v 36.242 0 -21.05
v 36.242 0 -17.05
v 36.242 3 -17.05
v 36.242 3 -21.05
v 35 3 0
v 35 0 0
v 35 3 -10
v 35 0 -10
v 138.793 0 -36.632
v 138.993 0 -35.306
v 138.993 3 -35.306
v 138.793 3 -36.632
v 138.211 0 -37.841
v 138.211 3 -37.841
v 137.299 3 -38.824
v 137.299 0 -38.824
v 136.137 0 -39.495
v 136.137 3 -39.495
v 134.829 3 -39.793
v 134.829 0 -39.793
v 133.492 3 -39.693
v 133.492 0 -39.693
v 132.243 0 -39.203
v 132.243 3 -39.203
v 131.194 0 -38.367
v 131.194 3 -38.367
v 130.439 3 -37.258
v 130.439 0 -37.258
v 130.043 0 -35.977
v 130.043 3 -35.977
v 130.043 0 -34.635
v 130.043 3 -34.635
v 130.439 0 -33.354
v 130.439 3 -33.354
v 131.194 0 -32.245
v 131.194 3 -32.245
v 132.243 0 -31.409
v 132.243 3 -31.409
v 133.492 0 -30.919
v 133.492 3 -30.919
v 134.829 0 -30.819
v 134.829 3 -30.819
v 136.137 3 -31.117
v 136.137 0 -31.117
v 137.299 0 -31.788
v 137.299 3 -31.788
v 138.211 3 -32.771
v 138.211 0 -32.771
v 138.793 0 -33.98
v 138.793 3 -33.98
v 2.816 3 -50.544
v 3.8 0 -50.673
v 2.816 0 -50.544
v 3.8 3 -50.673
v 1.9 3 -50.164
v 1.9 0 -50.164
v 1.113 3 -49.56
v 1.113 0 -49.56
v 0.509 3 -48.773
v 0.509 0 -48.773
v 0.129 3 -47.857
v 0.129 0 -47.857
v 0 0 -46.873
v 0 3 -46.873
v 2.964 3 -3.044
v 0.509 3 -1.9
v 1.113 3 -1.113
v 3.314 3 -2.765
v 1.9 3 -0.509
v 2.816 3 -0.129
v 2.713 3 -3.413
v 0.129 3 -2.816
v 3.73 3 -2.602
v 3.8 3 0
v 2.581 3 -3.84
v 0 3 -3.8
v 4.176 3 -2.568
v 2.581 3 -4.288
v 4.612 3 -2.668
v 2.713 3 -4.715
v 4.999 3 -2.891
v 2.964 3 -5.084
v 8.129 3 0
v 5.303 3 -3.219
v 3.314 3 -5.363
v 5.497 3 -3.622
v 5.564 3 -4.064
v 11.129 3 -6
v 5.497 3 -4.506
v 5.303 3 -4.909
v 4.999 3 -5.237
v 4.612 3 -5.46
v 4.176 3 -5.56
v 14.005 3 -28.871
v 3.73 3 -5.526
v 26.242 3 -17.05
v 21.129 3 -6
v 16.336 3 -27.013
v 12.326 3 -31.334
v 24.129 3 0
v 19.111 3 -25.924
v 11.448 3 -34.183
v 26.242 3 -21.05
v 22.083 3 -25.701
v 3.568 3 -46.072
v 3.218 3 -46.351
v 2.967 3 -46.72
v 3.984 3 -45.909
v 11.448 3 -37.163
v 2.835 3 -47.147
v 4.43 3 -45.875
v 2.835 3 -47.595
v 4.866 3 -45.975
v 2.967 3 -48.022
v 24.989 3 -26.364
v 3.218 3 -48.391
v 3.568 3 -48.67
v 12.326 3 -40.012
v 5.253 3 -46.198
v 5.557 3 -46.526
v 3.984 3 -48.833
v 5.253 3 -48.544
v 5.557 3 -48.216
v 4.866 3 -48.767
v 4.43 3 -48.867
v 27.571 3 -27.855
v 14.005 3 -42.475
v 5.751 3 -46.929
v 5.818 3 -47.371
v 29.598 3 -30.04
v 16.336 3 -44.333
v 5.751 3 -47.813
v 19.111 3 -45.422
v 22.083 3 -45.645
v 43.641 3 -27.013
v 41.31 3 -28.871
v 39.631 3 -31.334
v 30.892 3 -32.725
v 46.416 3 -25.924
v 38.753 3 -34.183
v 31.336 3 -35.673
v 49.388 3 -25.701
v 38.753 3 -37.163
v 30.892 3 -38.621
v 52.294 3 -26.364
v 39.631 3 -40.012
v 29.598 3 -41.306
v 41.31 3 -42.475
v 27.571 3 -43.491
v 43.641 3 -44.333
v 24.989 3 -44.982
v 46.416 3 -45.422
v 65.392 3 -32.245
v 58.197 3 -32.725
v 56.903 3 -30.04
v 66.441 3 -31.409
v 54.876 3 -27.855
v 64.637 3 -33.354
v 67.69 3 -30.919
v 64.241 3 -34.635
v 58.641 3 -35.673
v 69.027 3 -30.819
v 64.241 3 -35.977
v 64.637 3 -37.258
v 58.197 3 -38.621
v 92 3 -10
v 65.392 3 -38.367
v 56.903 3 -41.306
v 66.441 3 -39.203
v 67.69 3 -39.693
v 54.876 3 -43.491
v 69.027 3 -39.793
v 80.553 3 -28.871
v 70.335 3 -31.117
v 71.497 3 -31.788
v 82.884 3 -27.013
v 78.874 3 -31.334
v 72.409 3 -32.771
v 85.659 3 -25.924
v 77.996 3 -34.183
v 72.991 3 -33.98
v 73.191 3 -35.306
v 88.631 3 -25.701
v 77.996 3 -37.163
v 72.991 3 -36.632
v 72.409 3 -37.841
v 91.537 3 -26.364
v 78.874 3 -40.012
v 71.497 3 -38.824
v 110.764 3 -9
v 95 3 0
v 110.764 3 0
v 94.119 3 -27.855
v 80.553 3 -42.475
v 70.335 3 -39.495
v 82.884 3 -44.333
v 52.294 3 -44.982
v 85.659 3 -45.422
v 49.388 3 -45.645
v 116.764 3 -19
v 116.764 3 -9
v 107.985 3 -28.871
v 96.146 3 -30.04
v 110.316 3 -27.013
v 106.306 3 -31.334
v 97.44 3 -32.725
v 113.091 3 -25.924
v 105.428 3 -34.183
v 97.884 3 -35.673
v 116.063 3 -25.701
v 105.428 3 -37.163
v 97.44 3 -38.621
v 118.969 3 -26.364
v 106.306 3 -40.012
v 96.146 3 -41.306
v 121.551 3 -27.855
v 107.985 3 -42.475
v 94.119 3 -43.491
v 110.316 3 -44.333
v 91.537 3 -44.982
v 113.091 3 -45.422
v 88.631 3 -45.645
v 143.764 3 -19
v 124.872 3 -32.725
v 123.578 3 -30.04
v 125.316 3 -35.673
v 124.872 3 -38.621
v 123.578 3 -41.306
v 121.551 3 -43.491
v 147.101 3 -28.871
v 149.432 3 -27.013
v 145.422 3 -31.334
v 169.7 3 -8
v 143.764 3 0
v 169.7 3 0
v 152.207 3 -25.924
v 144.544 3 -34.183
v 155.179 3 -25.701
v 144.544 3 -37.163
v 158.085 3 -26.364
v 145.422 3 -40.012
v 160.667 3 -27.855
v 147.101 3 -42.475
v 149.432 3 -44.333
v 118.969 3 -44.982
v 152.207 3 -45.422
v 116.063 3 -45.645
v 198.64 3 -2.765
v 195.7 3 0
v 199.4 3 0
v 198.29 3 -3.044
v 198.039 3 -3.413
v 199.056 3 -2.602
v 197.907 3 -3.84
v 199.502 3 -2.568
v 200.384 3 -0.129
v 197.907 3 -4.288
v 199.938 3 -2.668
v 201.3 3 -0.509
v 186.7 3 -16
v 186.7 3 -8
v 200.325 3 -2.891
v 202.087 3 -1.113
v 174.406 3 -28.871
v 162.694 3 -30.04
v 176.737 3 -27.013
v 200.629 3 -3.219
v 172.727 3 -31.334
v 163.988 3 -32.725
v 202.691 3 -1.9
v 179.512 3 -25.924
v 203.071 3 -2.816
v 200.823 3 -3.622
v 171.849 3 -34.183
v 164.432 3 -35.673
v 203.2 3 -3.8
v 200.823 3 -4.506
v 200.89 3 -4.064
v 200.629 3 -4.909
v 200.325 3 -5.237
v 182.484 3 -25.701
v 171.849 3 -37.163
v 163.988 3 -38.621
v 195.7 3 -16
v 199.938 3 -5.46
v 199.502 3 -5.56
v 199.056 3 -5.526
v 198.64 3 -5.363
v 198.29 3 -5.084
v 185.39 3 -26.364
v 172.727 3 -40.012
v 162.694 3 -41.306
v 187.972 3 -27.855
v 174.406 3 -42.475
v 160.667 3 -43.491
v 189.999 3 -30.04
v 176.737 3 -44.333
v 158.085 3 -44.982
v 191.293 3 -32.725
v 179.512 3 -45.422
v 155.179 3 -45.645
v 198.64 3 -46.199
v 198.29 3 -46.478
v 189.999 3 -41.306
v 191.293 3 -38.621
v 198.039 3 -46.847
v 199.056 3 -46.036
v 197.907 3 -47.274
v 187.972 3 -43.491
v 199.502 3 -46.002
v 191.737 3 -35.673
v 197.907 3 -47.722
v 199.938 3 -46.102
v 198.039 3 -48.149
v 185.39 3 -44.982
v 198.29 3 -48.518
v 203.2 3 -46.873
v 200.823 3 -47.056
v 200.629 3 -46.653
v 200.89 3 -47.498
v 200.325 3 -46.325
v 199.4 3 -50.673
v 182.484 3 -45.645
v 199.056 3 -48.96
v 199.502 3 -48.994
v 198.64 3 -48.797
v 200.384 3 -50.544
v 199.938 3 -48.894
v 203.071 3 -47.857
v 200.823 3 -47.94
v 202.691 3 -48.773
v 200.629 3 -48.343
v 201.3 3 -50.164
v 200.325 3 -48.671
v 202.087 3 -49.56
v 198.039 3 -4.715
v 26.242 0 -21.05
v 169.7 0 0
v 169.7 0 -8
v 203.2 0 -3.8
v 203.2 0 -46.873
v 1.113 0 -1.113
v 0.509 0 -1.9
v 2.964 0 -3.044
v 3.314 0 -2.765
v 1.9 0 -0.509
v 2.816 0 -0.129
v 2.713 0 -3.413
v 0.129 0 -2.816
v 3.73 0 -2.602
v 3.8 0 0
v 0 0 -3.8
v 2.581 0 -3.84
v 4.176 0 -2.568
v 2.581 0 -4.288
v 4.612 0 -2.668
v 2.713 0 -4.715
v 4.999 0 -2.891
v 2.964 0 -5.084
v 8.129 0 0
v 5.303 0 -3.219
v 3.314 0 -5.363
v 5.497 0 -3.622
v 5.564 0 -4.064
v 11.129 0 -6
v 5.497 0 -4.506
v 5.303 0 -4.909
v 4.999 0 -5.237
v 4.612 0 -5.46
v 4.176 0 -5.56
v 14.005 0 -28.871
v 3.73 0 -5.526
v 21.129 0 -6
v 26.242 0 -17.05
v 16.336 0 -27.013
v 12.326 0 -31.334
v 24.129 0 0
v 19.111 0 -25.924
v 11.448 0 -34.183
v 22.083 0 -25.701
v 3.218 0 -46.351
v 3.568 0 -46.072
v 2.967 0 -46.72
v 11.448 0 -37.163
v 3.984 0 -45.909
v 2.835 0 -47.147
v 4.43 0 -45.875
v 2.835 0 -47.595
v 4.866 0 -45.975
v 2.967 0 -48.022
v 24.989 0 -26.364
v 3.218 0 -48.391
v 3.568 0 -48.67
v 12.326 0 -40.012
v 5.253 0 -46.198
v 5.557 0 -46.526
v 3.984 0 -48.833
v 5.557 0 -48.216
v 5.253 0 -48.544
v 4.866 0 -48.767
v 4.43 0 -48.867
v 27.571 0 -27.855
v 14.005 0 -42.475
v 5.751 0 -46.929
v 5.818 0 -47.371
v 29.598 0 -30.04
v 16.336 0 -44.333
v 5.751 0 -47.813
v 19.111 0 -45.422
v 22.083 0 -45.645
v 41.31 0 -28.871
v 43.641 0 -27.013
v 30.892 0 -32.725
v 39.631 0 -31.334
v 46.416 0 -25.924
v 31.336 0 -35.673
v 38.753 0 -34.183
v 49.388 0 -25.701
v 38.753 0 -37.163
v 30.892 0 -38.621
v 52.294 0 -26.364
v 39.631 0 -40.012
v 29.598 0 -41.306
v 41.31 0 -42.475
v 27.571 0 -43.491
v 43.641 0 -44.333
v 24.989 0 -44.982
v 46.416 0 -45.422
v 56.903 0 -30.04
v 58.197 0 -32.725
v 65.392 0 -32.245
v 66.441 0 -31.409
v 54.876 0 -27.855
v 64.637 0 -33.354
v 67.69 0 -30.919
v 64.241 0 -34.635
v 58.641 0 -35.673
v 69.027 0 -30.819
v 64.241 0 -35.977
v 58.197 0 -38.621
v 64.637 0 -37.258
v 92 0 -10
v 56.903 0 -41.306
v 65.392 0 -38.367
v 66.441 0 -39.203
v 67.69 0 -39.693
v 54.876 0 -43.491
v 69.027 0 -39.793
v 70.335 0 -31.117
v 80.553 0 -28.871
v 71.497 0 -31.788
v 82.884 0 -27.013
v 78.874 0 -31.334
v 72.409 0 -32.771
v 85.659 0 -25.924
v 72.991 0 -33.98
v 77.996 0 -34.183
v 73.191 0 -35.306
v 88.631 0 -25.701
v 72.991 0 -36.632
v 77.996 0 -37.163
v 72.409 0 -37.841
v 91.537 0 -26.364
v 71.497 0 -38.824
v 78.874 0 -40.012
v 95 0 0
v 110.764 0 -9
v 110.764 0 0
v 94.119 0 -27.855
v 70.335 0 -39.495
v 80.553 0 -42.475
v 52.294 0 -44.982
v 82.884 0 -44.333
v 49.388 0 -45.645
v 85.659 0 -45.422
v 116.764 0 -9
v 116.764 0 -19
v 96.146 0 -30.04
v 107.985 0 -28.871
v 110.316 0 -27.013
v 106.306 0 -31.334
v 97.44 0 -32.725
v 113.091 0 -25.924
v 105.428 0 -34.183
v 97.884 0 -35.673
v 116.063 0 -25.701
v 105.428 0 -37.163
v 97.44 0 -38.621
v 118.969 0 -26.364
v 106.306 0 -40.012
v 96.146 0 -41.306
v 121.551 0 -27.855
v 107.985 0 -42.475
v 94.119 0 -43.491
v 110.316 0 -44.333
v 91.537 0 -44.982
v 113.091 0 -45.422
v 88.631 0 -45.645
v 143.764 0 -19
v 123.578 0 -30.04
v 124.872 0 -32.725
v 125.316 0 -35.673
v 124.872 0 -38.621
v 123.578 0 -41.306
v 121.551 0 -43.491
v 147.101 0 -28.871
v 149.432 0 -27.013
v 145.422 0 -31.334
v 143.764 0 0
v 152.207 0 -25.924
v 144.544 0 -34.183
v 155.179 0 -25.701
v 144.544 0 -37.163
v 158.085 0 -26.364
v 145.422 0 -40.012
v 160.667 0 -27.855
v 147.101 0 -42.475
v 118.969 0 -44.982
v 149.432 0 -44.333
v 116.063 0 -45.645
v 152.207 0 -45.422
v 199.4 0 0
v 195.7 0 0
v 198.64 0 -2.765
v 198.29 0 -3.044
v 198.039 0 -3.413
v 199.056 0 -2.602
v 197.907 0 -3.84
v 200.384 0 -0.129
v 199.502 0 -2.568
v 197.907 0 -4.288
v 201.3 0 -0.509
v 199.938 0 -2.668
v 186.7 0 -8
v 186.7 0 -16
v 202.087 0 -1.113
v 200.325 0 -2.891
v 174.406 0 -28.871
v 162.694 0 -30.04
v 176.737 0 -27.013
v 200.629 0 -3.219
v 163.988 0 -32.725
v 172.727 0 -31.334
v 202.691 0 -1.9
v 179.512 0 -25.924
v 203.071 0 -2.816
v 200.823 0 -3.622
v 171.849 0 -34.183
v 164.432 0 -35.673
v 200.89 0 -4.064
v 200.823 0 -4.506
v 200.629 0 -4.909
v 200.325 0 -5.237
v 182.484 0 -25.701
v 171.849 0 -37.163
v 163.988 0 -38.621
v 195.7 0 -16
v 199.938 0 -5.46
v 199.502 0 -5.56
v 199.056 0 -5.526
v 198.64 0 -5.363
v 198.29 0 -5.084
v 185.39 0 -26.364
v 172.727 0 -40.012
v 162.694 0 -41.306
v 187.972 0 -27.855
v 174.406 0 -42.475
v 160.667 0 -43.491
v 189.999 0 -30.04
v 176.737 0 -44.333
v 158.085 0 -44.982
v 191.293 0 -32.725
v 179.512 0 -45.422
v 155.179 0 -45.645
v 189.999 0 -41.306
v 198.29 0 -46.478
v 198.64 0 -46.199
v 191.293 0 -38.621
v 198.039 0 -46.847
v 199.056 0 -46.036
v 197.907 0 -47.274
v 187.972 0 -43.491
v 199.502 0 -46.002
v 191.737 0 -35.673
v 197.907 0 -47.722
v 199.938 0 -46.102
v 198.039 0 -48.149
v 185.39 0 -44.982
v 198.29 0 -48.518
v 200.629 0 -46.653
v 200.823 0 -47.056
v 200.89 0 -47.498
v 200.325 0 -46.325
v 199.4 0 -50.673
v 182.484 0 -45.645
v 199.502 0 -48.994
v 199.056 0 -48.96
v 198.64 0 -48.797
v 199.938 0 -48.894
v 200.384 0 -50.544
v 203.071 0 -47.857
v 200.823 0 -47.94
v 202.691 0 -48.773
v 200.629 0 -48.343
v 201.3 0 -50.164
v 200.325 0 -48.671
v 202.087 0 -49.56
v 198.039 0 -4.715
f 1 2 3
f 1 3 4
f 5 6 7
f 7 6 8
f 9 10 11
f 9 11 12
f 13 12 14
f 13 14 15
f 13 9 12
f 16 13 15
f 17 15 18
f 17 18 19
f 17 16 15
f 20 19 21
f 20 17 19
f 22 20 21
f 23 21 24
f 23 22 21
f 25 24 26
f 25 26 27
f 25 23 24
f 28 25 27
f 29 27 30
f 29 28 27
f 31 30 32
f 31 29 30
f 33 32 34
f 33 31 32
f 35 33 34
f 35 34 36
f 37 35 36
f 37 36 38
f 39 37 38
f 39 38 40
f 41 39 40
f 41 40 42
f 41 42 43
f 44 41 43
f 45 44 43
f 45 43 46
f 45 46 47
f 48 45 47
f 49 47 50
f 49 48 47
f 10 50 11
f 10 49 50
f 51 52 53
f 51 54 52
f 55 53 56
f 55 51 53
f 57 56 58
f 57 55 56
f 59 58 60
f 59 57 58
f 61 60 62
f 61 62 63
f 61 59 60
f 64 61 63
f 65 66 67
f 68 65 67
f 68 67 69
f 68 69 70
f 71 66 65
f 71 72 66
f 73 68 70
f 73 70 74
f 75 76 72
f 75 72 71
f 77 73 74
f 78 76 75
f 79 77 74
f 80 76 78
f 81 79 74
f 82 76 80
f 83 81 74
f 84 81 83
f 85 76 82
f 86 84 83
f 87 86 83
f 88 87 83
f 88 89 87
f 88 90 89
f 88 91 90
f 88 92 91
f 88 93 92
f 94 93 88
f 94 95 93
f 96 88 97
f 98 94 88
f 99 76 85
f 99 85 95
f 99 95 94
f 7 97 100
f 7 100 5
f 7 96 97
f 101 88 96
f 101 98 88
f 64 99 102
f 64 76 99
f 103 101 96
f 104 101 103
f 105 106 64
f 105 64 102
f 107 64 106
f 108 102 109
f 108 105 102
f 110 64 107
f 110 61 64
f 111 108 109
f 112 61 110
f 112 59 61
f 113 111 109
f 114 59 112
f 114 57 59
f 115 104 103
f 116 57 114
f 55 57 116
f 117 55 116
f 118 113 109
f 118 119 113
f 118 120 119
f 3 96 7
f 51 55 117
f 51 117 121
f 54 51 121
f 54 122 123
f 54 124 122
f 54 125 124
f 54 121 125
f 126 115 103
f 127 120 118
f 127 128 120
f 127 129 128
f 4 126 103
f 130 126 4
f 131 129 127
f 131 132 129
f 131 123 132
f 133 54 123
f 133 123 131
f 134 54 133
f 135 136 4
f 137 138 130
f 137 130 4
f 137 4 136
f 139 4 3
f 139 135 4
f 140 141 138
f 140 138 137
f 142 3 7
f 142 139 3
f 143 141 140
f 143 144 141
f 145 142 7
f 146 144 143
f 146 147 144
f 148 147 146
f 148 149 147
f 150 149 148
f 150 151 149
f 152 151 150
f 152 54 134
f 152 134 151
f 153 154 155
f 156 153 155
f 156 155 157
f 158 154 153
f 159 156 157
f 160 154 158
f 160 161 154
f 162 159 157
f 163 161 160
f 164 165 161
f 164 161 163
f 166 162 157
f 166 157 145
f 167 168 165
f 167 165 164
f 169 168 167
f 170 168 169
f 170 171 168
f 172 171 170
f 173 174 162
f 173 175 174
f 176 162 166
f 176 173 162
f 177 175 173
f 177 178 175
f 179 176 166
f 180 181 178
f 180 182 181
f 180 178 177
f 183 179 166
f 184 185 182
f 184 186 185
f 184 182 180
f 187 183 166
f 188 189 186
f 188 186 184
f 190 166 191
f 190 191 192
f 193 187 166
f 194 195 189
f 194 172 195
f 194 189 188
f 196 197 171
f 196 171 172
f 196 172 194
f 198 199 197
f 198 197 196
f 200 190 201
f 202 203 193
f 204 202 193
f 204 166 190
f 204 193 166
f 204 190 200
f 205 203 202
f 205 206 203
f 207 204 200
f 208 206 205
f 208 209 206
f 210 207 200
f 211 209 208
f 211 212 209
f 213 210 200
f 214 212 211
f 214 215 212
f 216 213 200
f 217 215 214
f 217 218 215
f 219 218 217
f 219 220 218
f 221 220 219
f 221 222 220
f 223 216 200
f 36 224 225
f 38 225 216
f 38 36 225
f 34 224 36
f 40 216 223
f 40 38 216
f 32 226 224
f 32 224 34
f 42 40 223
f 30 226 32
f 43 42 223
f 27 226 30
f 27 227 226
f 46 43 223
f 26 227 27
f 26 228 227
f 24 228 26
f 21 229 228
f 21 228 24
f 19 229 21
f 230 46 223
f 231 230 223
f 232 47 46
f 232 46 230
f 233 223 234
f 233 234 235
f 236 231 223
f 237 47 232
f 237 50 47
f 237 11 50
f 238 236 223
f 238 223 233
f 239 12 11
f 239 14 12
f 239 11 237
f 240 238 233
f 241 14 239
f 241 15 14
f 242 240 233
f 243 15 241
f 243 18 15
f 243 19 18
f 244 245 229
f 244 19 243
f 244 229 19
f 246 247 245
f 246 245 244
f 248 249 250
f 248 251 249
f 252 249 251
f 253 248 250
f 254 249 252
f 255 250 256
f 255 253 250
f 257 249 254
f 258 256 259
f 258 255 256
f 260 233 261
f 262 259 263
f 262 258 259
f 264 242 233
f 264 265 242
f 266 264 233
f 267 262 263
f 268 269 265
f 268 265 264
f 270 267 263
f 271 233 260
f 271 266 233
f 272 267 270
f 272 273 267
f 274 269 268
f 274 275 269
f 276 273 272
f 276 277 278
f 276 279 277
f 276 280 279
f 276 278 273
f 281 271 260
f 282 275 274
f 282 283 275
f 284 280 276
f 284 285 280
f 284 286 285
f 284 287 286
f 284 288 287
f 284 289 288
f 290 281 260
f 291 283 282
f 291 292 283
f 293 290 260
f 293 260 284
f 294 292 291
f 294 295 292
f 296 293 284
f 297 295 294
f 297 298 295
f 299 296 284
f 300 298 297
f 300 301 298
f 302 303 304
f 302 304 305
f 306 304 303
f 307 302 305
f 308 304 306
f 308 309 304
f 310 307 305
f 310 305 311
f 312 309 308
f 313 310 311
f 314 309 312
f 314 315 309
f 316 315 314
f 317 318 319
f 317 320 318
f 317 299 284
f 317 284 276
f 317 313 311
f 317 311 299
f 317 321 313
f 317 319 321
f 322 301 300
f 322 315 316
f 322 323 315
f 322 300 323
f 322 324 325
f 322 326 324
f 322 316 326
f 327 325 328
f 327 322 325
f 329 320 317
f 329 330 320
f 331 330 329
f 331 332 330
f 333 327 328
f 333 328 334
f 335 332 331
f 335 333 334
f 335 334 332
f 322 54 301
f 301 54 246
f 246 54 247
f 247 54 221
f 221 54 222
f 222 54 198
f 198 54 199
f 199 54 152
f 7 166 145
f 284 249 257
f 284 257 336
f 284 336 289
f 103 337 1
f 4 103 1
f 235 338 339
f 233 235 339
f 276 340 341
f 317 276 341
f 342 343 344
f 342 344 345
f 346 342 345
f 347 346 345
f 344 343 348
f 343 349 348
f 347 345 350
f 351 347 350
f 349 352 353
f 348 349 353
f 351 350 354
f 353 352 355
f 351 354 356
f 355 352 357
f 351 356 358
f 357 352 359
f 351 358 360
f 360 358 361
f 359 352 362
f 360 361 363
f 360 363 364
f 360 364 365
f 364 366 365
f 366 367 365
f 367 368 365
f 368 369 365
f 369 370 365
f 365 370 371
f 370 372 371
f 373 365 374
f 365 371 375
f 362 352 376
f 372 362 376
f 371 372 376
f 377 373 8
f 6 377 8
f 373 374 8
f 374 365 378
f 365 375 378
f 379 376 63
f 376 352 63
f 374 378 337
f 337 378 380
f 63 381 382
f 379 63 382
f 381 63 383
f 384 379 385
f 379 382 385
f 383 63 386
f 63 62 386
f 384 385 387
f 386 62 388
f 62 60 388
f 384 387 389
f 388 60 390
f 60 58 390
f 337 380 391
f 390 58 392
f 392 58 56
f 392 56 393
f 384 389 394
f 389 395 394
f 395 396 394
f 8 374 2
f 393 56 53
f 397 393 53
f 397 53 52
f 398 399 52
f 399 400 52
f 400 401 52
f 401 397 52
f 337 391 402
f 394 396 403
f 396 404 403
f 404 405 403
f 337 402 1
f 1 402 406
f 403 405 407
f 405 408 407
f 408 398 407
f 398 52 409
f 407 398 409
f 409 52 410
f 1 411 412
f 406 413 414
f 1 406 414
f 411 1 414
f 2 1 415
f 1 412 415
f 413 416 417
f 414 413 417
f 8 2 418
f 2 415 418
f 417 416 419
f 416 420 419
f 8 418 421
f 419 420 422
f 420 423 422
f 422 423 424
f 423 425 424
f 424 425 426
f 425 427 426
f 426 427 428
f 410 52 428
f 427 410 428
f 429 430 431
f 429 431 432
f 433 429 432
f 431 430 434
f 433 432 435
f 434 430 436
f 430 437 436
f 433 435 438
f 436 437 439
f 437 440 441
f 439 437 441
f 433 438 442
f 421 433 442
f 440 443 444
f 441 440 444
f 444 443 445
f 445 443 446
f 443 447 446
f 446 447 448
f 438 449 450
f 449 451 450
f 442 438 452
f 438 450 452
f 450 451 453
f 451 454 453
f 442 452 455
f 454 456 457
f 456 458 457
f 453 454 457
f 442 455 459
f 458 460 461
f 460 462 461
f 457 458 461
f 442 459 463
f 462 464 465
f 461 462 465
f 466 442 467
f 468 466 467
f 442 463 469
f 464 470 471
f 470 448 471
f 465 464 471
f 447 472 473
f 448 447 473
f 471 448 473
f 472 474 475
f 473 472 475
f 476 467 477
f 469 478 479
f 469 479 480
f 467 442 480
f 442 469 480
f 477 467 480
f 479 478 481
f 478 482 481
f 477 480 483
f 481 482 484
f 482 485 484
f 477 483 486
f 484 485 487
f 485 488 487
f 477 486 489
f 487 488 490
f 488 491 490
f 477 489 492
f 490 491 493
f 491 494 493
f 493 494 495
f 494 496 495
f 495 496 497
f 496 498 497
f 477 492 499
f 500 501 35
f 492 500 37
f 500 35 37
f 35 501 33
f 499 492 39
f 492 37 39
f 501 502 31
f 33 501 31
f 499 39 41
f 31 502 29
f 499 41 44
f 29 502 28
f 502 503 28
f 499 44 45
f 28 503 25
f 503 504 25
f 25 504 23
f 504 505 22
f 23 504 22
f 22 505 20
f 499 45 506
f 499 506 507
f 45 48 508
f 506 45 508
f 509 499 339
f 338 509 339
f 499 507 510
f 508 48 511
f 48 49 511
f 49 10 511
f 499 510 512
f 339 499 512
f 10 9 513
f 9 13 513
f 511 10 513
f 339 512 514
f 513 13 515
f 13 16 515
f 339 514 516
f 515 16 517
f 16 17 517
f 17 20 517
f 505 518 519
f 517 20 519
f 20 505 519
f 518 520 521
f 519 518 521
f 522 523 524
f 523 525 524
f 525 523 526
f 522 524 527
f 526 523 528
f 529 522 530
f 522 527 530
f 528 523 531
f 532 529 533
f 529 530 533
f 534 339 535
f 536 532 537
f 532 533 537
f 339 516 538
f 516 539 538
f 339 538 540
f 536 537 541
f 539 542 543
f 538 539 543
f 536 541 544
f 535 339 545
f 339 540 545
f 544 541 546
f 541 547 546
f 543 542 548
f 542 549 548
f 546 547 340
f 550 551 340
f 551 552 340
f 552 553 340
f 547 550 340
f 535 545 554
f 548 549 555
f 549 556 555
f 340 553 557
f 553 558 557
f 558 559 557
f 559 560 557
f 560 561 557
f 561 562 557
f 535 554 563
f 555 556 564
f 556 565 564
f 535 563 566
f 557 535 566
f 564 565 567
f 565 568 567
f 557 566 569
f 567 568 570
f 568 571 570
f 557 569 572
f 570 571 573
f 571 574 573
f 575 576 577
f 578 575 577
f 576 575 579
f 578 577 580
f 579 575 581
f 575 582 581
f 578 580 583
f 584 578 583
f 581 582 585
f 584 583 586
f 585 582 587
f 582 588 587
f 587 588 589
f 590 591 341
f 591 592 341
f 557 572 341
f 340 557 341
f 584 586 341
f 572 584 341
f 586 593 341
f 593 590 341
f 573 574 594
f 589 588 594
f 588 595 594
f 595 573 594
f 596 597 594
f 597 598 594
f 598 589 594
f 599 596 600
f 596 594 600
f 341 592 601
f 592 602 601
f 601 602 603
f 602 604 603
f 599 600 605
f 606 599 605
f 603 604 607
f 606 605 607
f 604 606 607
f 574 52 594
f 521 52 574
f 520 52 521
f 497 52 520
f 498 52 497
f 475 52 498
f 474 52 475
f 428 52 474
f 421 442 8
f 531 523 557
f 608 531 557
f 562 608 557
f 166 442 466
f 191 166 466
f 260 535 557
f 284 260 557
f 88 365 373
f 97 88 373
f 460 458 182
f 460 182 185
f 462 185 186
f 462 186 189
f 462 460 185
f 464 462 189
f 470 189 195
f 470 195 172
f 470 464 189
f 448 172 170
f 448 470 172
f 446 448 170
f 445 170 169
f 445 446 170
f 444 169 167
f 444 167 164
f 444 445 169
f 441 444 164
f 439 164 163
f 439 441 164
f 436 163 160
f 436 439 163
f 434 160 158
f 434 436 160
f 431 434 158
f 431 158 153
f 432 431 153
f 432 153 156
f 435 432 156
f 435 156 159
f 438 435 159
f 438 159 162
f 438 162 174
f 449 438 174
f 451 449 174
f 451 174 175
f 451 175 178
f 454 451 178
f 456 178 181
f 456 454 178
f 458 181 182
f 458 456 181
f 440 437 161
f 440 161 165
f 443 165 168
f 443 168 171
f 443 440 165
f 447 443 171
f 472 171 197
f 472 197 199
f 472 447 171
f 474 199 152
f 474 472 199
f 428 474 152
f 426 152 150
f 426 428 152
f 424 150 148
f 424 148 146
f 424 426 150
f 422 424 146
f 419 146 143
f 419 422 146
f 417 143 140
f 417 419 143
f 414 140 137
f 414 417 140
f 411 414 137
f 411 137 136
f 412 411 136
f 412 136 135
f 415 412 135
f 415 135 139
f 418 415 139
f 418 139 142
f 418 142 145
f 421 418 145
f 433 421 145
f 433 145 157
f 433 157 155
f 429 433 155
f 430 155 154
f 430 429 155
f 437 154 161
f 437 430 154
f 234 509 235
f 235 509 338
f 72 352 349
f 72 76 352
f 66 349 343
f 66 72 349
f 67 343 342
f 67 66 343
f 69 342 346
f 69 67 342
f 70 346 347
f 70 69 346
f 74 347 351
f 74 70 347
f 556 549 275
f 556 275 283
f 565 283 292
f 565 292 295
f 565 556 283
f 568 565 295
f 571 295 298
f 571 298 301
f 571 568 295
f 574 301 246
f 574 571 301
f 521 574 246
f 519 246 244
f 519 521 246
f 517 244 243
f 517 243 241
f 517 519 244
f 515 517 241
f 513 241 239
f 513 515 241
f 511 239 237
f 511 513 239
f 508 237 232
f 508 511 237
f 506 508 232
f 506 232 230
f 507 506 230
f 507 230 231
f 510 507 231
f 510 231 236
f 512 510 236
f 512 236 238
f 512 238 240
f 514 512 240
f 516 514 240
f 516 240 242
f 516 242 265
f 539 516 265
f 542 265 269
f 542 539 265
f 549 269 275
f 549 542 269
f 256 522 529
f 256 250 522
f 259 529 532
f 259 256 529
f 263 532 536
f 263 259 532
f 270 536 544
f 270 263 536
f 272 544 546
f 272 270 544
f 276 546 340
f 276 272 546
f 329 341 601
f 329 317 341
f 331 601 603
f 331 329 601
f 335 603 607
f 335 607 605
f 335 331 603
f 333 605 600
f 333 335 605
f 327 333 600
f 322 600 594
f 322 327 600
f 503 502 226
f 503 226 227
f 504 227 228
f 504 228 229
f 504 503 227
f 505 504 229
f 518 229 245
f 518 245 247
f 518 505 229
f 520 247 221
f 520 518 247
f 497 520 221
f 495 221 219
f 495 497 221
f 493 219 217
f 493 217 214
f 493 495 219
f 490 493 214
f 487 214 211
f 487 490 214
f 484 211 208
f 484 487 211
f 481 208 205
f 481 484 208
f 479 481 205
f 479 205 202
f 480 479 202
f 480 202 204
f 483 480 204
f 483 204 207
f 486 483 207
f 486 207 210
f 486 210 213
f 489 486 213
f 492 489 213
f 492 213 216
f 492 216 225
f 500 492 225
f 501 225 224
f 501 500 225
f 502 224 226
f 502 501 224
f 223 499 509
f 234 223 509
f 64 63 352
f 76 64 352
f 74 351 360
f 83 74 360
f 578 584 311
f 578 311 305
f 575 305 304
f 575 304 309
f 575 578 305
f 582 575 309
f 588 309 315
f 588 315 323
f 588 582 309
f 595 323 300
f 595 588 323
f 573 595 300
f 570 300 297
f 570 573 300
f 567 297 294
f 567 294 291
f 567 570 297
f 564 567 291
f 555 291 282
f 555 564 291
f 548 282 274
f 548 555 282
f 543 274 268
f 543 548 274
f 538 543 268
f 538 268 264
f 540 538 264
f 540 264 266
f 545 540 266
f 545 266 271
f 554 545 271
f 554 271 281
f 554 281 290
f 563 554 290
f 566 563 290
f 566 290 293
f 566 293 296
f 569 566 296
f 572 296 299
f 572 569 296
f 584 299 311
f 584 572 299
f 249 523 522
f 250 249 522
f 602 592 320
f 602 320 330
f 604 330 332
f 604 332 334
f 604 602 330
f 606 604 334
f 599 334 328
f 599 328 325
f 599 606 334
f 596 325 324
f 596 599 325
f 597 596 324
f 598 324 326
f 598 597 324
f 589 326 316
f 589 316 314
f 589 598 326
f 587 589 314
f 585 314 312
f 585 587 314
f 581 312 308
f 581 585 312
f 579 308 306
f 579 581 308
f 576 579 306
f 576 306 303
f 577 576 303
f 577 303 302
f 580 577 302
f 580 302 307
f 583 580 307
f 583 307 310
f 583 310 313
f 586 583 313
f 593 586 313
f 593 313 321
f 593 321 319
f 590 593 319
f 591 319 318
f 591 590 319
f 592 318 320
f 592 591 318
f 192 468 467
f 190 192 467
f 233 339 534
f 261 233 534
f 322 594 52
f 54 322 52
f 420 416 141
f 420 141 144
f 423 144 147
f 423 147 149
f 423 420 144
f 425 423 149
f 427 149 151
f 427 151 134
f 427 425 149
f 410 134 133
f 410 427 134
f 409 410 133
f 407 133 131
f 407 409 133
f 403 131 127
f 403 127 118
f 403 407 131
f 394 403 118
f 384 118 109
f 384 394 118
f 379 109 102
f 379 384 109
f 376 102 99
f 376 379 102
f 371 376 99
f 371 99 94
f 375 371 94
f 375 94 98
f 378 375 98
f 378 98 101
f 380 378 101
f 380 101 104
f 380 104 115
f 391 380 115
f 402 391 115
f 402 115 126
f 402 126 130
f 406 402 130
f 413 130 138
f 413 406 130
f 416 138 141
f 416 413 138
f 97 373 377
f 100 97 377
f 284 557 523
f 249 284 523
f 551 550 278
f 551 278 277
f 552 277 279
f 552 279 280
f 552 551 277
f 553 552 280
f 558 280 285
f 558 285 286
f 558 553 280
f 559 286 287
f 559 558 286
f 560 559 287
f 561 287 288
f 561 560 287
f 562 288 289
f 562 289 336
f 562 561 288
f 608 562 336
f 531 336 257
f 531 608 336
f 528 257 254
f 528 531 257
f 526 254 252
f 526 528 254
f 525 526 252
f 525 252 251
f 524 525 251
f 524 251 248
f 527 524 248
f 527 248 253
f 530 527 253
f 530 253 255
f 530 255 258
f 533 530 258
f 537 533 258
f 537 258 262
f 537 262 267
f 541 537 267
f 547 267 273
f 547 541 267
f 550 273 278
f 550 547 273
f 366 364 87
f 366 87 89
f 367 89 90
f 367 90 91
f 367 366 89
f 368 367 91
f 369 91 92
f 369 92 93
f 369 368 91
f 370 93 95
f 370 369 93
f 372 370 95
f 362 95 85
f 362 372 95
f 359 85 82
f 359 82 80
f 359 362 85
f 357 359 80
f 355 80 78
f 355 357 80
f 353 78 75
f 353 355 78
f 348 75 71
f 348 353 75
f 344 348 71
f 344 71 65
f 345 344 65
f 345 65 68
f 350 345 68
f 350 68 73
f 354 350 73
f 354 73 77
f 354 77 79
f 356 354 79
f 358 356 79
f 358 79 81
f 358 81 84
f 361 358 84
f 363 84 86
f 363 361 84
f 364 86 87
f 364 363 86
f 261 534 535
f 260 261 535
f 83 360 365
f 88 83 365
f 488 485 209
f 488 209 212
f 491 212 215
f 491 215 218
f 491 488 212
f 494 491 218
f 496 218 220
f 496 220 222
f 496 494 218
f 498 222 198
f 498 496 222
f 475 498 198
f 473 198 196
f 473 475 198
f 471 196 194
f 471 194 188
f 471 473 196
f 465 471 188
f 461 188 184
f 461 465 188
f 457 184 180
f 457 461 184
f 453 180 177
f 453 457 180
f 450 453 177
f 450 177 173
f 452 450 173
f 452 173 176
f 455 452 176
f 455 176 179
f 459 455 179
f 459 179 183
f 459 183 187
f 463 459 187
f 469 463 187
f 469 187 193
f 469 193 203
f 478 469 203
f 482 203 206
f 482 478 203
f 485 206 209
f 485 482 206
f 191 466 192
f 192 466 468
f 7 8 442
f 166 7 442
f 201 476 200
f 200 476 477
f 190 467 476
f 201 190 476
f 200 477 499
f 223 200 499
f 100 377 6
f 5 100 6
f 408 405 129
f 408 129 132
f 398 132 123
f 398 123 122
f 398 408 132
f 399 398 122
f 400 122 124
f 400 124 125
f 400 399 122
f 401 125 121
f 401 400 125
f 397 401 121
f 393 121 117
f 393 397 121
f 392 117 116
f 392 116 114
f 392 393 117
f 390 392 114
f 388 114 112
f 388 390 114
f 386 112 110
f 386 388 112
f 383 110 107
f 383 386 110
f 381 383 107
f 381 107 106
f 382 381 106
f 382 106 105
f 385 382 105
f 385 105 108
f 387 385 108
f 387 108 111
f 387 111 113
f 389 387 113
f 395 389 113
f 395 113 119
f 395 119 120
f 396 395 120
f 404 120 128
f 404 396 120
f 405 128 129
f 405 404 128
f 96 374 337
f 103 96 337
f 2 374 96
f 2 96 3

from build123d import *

# Parameters (mm, degrees)
SKETCH_1_R      = 1.5
SKETCH_1_W      = 10
SKETCH_1_H      = 4
SKETCH_1_R_2    = 10
SKETCH_1_R_3    = 4.5
EXTRUDE_1_DEPTH = 3
FILLET_1_R      = 3.8


with BuildPart() as part:
    # 草图1 → 凸台-拉伸1 (new body)
    with BuildSketch(Plane(origin=(0, 0, 0), x_dir=(1, 0, 0), z_dir=(0, 1, 0))):
        Polygon((195.7, 16), (195.7, 0), (203.2, 0), (203.2, 50.673), (0, 50.673), (0, 0), (8.129, 0), (11.129, 6), (21.129, 6), (24.129, 0), (35, 0), (35, 10), (61.620357325, 10), (79.620357325, 10), (81, 10), (92, 10), (95, 0), (110.764, 0), (110.764, 9), (116.764, 9), (116.764, 19), (143.764, 19), (143.764, 0), (169.7, 0), (169.7, 8), (186.7, 8), (186.7, 16), align=None)
        with Locations((4.064, 4.064)):
            Circle(SKETCH_1_R, mode=Mode.SUBTRACT)
        with Locations((31.242, 19.05)):
            Rectangle(SKETCH_1_W, SKETCH_1_H, mode=Mode.SUBTRACT)
        with Locations((199.39, 4.064)):
            Circle(SKETCH_1_R, mode=Mode.SUBTRACT)
        with Locations((21.336, 35.673)):
            Circle(SKETCH_1_R_2, mode=Mode.SUBTRACT)
        with Locations((48.641, 35.673)):
            Circle(SKETCH_1_R_2, mode=Mode.SUBTRACT)
        with Locations((68.691, 35.306)):
            Circle(SKETCH_1_R_3, mode=Mode.SUBTRACT)
        with Locations((87.884, 35.673)):
            Circle(SKETCH_1_R_2, mode=Mode.SUBTRACT)
        with Locations((4.318, 47.371)):
            Circle(SKETCH_1_R, mode=Mode.SUBTRACT)
        with Locations((115.316, 35.673)):
            Circle(SKETCH_1_R_2, mode=Mode.SUBTRACT)
        with Locations((134.493, 35.306)):
            Circle(SKETCH_1_R_3, mode=Mode.SUBTRACT)
        with Locations((154.432, 35.673)):
            Circle(SKETCH_1_R_2, mode=Mode.SUBTRACT)
        with Locations((181.737, 35.673)):
            Circle(SKETCH_1_R_2, mode=Mode.SUBTRACT)
        with Locations((199.39, 47.498)):
            Circle(SKETCH_1_R, mode=Mode.SUBTRACT)
    extrude(amount=EXTRUDE_1_DEPTH)

    # 圆角1
    fillet_1_edges = [part.edges().sort_by_distance(p)[0] for p in [
        (0, 1.5, 0),
        (0, 1.5, -50.673),
        (203.2, 1.5, -50.673),
        (203.2, 1.5, 0),
    ]]
    fillet(fillet_1_edges, radius=FILLET_1_R)


solid = part.part
